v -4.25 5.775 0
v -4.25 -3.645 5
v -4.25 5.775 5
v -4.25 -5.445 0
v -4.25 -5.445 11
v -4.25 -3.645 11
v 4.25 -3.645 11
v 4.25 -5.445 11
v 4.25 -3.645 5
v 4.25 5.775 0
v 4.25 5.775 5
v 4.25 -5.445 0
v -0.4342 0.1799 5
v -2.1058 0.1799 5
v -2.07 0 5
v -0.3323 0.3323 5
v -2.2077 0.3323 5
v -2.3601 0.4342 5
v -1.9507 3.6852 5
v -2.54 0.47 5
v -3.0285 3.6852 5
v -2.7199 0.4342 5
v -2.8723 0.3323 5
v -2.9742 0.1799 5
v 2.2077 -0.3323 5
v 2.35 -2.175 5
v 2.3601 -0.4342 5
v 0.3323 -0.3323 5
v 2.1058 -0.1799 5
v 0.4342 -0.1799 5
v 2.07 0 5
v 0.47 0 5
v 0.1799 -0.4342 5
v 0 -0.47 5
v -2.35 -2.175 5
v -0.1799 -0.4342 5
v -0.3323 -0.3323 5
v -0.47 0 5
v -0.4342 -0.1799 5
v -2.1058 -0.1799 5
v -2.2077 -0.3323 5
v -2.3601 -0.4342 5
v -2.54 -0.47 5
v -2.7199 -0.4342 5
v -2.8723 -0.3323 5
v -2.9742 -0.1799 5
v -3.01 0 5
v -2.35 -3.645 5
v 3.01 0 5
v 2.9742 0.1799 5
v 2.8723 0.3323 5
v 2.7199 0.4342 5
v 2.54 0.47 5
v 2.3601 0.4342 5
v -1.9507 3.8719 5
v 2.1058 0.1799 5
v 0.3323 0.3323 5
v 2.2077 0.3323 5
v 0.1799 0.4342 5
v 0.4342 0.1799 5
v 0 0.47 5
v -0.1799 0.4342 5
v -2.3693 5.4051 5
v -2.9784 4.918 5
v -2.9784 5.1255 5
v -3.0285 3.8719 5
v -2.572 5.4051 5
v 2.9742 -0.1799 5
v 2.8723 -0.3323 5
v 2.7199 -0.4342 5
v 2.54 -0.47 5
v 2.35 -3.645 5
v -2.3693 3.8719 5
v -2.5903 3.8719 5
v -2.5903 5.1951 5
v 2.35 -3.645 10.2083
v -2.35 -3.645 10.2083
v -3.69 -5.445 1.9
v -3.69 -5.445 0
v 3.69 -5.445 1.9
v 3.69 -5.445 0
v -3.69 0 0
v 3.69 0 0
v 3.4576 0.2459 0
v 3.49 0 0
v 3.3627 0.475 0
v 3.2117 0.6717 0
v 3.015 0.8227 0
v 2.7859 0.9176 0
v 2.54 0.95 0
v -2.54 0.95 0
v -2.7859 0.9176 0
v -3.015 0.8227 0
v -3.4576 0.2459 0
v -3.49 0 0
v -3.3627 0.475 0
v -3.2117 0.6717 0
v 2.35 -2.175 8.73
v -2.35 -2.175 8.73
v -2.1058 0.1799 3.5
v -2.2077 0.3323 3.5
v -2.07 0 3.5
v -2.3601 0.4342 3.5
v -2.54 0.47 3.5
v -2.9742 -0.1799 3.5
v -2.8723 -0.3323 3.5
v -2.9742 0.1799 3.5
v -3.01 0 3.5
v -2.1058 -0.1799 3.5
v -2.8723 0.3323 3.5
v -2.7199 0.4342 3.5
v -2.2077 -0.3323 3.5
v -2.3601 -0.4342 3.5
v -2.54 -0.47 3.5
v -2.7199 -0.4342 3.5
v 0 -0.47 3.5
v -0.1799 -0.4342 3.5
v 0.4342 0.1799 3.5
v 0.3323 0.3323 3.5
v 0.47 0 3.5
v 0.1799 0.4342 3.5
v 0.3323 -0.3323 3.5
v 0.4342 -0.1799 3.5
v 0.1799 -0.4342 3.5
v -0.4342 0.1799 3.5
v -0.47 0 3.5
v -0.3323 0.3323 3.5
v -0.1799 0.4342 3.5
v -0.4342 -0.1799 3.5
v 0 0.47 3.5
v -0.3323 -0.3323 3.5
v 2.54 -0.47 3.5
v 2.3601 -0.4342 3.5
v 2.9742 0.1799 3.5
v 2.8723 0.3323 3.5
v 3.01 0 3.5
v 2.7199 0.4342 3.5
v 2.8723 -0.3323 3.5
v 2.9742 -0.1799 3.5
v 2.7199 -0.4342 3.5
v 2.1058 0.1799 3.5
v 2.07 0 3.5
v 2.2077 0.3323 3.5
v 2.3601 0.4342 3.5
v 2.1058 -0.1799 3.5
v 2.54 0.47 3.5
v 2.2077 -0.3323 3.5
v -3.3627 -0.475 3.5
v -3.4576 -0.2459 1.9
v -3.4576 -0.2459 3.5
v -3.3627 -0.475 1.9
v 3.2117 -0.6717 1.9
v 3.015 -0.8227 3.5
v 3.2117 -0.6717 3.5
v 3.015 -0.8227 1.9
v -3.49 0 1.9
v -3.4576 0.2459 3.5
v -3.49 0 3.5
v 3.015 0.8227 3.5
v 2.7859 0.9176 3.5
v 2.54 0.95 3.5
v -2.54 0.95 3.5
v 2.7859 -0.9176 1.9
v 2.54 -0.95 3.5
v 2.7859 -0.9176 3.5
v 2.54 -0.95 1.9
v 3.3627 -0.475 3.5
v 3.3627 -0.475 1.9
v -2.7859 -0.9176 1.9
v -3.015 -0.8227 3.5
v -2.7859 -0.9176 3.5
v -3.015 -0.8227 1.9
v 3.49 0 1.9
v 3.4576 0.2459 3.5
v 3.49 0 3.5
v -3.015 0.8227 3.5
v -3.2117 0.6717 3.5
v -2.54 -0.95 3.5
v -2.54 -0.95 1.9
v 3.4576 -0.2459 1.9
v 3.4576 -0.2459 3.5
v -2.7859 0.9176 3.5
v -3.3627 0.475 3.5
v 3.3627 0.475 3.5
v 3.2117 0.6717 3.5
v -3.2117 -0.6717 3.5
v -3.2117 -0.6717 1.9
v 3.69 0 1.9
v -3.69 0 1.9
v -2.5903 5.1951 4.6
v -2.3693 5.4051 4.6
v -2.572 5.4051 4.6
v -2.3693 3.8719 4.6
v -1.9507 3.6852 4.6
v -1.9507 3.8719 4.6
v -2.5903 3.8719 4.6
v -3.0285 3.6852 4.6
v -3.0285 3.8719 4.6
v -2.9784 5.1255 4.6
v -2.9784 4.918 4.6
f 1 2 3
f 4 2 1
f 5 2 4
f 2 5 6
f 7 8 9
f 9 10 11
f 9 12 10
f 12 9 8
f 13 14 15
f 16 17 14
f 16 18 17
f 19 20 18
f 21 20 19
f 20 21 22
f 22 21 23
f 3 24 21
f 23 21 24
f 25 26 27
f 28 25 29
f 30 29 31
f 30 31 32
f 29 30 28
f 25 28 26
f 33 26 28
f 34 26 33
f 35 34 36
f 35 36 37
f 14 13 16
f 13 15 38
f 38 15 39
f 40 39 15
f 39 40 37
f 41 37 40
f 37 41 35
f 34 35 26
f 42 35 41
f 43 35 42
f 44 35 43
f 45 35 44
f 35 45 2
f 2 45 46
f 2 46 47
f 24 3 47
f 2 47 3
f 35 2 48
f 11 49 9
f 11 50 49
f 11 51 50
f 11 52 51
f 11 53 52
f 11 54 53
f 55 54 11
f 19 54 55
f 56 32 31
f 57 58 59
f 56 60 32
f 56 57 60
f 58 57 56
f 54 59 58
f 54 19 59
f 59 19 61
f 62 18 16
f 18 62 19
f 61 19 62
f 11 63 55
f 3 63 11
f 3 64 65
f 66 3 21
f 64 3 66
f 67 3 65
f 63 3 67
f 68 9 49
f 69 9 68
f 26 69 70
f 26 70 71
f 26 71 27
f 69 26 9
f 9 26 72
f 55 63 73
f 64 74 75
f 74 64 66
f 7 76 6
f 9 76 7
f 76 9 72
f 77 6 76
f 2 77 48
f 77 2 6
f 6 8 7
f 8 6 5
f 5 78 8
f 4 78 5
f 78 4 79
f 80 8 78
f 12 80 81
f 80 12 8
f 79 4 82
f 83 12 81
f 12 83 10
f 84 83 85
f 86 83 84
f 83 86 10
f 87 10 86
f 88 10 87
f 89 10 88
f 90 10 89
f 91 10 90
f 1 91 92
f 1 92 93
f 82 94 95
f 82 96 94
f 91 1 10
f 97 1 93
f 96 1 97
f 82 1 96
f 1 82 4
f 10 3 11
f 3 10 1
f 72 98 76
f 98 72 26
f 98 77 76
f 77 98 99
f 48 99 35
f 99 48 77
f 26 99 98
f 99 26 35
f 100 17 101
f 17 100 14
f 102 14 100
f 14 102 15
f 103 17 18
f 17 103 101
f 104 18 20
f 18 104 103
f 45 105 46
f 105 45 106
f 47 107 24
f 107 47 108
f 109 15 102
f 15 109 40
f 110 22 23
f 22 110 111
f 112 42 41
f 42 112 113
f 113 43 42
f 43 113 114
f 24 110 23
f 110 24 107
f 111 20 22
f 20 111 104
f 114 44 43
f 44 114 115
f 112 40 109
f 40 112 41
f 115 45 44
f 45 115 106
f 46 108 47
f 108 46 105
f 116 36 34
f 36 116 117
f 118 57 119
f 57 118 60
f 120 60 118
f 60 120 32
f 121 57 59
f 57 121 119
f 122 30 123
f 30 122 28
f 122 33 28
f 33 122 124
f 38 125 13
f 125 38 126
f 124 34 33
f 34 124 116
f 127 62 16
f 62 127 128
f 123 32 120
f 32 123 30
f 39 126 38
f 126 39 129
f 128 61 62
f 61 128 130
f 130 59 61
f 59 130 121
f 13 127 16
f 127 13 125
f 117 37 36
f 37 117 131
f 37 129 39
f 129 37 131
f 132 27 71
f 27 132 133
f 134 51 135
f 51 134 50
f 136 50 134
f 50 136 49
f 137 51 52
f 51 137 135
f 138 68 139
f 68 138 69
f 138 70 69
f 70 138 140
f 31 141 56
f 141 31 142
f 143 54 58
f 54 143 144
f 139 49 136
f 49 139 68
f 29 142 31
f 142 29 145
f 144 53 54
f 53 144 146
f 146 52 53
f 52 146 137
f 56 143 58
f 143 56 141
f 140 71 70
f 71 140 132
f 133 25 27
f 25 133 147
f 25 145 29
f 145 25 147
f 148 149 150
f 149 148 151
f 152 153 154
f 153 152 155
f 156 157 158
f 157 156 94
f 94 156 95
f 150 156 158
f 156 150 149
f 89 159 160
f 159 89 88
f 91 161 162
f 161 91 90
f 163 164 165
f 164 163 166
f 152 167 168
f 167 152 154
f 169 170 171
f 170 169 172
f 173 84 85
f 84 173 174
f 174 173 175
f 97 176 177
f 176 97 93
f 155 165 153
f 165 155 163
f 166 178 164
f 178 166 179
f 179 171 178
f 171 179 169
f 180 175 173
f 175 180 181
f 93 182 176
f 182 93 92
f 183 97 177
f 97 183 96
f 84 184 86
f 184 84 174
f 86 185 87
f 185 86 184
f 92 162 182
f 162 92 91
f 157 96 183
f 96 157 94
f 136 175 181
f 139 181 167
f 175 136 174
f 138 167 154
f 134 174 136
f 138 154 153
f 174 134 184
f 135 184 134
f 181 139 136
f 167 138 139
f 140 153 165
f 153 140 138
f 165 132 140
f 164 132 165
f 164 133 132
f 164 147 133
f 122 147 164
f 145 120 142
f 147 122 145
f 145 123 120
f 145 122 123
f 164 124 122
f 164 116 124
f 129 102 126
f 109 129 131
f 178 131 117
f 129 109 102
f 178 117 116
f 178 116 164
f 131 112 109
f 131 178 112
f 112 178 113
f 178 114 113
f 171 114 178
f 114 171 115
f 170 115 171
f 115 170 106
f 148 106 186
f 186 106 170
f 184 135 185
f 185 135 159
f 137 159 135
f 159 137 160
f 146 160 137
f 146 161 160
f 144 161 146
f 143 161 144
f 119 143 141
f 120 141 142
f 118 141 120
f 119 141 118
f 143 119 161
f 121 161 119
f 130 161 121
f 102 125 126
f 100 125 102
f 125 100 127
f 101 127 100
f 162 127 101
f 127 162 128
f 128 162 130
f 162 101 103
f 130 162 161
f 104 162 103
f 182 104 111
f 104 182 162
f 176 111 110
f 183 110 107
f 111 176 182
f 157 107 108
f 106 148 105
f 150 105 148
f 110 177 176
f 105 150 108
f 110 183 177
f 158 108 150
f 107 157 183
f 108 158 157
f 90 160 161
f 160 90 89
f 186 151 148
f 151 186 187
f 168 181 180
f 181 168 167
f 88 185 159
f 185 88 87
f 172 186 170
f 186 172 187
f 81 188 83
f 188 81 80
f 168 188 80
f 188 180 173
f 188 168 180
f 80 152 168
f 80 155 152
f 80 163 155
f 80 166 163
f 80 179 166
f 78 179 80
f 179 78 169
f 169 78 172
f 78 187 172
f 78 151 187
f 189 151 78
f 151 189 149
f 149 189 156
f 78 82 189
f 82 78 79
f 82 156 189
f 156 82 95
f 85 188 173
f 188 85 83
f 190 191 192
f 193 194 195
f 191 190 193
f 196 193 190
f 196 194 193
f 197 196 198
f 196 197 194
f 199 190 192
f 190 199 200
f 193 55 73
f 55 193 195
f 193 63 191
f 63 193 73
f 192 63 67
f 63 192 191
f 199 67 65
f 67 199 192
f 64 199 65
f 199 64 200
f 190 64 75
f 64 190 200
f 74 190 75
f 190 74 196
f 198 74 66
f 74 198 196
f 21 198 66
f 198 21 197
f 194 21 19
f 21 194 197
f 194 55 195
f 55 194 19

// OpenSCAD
// SPDX-FileCopyrightText: 2026 Alon A. Rabinowitz
// SPDX-License-Identifier: CC-BY-4.0
// Shared under the Creative Commons Attribution 4.0 International licence
// (LICENSES/CC-BY-4.0.txt): reuse freely, including commercially, with attribution.

// 2.54 mm fan connector, printed: a male header and a female plug, 2, 3 or 4 pins, that fit each other and the
// usual 3-pin fan plug of the KK 254 kind. The pins of the male and the contacts of the female are 22 AWG solid
// wire, bared: no crimp terminals.
//
// Drawn from one fan plug measured with calipers (Alon, 9 Oct 2026) and the 2.54 mm pitch; no other model was
// used. One self-contained file: the Customizer's groups are the settings, [Hidden] what is worked out from them.
//
// THE FRAME. The pins run along X at Y = 0, pin 1 at -X, pointing up (+Z). The female's text face is towards +Y,
// its ribs towards -Y. The male prints on its underside; the female prints standing on its back end, the open end
// up. "pair" draws the female seated on the male.

/* [Part] */
part = "male";          // [male, female, coupon, pair]
pins = 3;               // [2, 3, 4]

/* [The plug, measured on a fan's 3-pin plug] */
plug_a3 = 8.0;          // MEASURED: across its pins, 3-pin (A). n pins: this plus a pitch for each pin more.
plug_b = 5.2;           // MEASURED: its thickness without the ribs, over the lip (B).
plug_c = 12.77;         // MEASURED: its length along the wires (C).
plug_d = 2.55;          // MEASURED: from the text face to the near wall of a pin's hole (D).
plug_hole = 1.45;       // MEASURED: a pin's hole in the open end.
rib = [1.1, 5.2, 6.67]; // MEASURED: the ribs on the face opposite the text: width, the gap between them, and the plug's thickness over them. An NZXT fan's ribs are 0.92 wide and stand 1.08 proud, where these stand 1.47.
lip = [0.3, 2.2];       // MEASURED: the lip across the open end between the ribs: its height, and its length along the plug (an NZXT fan's: 1.9).
rib_inset_2 = 0.3;      // <<CONFIRM>> 2-pin: the ribs stand this far in from the ends, as the 3-pin's do. 3 and 4 pins keep the 3-pin's ribs over pins 1-3.
pitch = 2.54;

/* [Wire: 22 AWG solid] */
wire = [0.64, 1.6];     // The core, by the gauge (0.644), and the insulation's outside (MEASURED).

/* [Male] */
male_pin = 6;           // How far each pin stands above the block: a header's mating length.
male_base = [5, 1.5];   // The block: its height, and how much of it at the top holds the core alone - below, a slot takes the insulation.
male_wall = [1.8, 6];   // The wall behind the plug: its thickness, and how far it stands above the block.
male_front = 2.5;       // The block runs on this far past the plug's text face, for pin 1's mark.
play = 0.25;            // Round the plug: to the wall, to the key and between its ribs.

/* [Female] */
interference = 0.05;    // How far the contact wire stands into a pin's way. Print the coupon and pick the one that holds. <<CONFIRM>>
female_depth = 7;       // The cavity's depth from the open end: past a pin's 6 mm.
female_slot = 4;        // The insulation's slot, from the back end.
female_hook = [0.8, 1.2];   // The notch in the open end for the contact's bent-over tip: its depth and its length towards the text face.
female_chamfer = 0.3;   // Each cavity's lead-in.

/* [Printing - mirrors the print profile; scad-check.sh compares the first two with the slicer's] */
fdm_layer_h     = 0.2;
fdm_extrusion_w = 0.45;
fdm_hole_comp   = 0.15; // Added to every hole's radius - docs/fdm-design-rules.md section 2.

/* [Hidden] */
$fn = 24;
eps = 0.01;
coupon_i = [0, 0.05, 0.1, 0.15];
// The plug: across n pins; each pin's X, pin 1 first; the ribs' middle (pin 2's for 3 and 4 pins); the gap between
// them; Y from the pins to the text face, to the face behind the lip, to the lip, to the ribs' tips.
plug_a = plug_a3 + (pins - 3) * pitch;
xs = [for (k = [0 : pins - 1]) (k - (pins - 1) / 2) * pitch];
rib_x = pins == 2 ? 0 : xs[1];
rib_gap = pins == 2 ? plug_a - 2 * (rib_inset_2 + rib[0]) : rib[1];
y_text = plug_d + plug_hole / 2;
y_lip = plug_b - y_text;
y_back = y_lip - lip[0];
y_ribs = rib[2] - y_text;
// The male: its wall's inside, its key's face and width, its holes as cut, its ends, back and front.
m_wall_y = -(y_ribs + play);
m_key_y = -(y_lip + play);
m_key_w = rib_gap - 2 * play;
core_d = wire[0] + 2 * fdm_hole_comp;
ins_d = wire[1] + 2 * fdm_hole_comp;
m_x0 = -plug_a / 2 - play;
m_x1 = plug_a / 2 + play;
m_y0 = m_wall_y - male_wall[0];
m_y1 = y_text + male_front;
m_strip = male_base[1] + male_pin;
// The female: the contact wire's line, out from the pins towards the text face; the cavity, as cut, from the
// pin's far side to the wire's; how much of each wire to bare.
f_wire_y = (wire[0] + wire[0]) / 2 - interference;
f_cav = [wire[0] + 2 * 0.1 + 2 * fdm_hole_comp, -(wire[0] / 2 + 0.1 + fdm_hole_comp)];   // width, and its pin-side wall
f_strip = plug_c - female_slot + female_hook[1];

assert(pins >= 2 && pins <= 4, "pins: 2, 3 or 4");
assert(m_key_w > 2 * fdm_extrusion_w && m_key_y > m_wall_y, "the male's key must be wide enough to print and stand out from its wall");
assert(male_base[0] - male_base[1] > ins_d && pitch - core_d > fdm_extrusion_w,
    "the male's block must hold the insulation's slot under the cores' holes, a line of it between them");
assert(pitch - f_cav[0] > fdm_extrusion_w, "the female's cavities must leave a line of wall between them");
assert(f_cav[1] > -y_back + 2 * fdm_extrusion_w, "the female's cavities must leave two lines of wall to the ribbed face");
assert(f_wire_y + wire[0] / 2 + fdm_hole_comp < y_text - 2 * fdm_extrusion_w && f_wire_y + female_hook[1] < y_text - fdm_extrusion_w,
    "the female's contacts and their hooks must stay inside the text face");
assert(female_depth + eps < plug_c - female_slot, "the female's cavities must stop short of the insulation's slot");
assert(rib_gap > 2 * fdm_extrusion_w + 2 * play && plug_a / 2 - abs(rib_x) >= rib_gap / 2 + rib[0] - eps,
    "the ribs must fit on the plug, with a key between them");

// ------------------------------------------------------------------ the male
// The block and the wall, one L-shaped profile along X: two boxes sharing the back face would meet in a line of
// T-junctions. Each wire comes up its slot from below, its insulation stopping where the slot ends, so it cannot be
// pulled out upwards; its bared core goes on up its hole and stands as the pin. Under the block each wire bends over
// into a groove to the back edge: once the block is fixed down, that bend stops a pin being pushed down.
module male_key() let(h = male_base[0], wh = male_wall[1] - 0.5, d = m_key_y - m_wall_y, e = 0.3)
    // its top chamfered at 45 degrees, a lead-in between the ribs, 0.5 mm under the wall's top; it starts e inside
    // the wall, so the chamfer crosses the wall's face: an edge lying in that face leaves sliver facets
    translate([rib_x - m_key_w / 2, m_wall_y - e, h - eps]) hull() {
        cube([m_key_w, d + e, wh - d - e + eps]);
        cube([m_key_w, eps, wh + eps]);
    }
module male() let(h = male_base[0], c = male_base[1], wh = male_wall[1], s = xs[pins - 1] - xs[0] + ins_d + 0.4)
    difference() {
        union() {
            translate([m_x0, 0, 0]) rotate([90, 0, 90]) linear_extrude(m_x1 - m_x0)
                polygon([[m_y0, 0], [m_y1, 0], [m_y1, h], [m_wall_y, h], [m_wall_y, h + wh], [m_y0, h + wh]]);
            male_key();
        }
        for (x = xs) translate([x, 0, h - c - eps]) cylinder(d = core_d, h = c + 1, $fn = 16);
        translate([0, 0, -1]) linear_extrude(h - c + 1)
            hull() for (x = [xs[0], xs[pins - 1]]) translate([x, 0]) circle(d = ins_d);
        translate([-s / 2, m_y0 - 1, -1]) cube([s, 1 - m_y0, ins_d + 1]);
        // pin 1's mark, in front of where the plug stands
        translate([xs[0], (y_text + m_y1) / 2, h - 0.4]) linear_extrude(1)
            text("1", size = 1.8, halign = "center", valign = "center");
    }
// The male's pins: the wires' bared cores, from where the insulation stops to the tips.
module male_pins() for (x = xs) translate([x, 0, male_base[0] - male_base[1]]) cylinder(d = wire[0], h = m_strip, $fn = 16);

// ------------------------------------------------------------------ the female
// Drawn with its open end at Z = 0 and its back end at Z = plug_c. Each wire comes in from the back: its insulation
// in a slot that stops it going further in, its bared core on through its hole and down the cavity along the text
// side's wall, and its tip bent over into a notch in the open end, which stops it being pulled back out. A pin going
// in squeezes past the wire by `interference`.
// The cavity's text-side wall stands 0.05 mm past the core's hole: level with it, the two would be tangent.
module female_cavity(x, i) let(cy = (wire[0] + wire[0]) / 2 - i, w = f_cav[0], y0 = f_cav[1],
                               y1 = cy + core_d / 2 + 0.05, ch = female_chamfer) {
    // the cavity, with a lead-in at the open end
    translate([x - w / 2, y0, -1]) cube([w, y1 - y0, female_depth + 1]);
    hull() {
        translate([x - w / 2 - ch, y0 - ch, -1]) cube([w + 2 * ch, y1 - y0 + 2 * ch, 1]);
        translate([x - w / 2, y0, ch]) cube([w, y1 - y0, eps]);
    }
    // the core's hole, on from the cavity's end to the insulation's slot
    translate([x, cy, female_depth - eps]) cylinder(d = core_d, h = plug_c - female_slot - female_depth + 2 * eps, $fn = 16);
    // the hook's notch, from the wire's line towards the text face
    translate([x - core_d / 2, cy, -1]) cube([core_d, female_hook[1], female_hook[0] + 1]);
}
module female_body() let(a = plug_a, c = plug_c, rw = rib[0])
    union() {
        translate([-a / 2, -y_back, 0]) cube([a, y_text + y_back, c]);
        // the lip across the open end, between the ribs
        translate([rib_x - rib_gap / 2 - eps, -y_lip, 0]) cube([rib_gap + 2 * eps, lip[0] + eps, lip[1]]);
        for (s = [-1, 1]) translate([rib_x + s * (rib_gap + rw) / 2 - rw / 2, -y_ribs, 0]) cube([rw, y_ribs - y_back + eps, c]);
    }
module female(i = interference) let(cy = (wire[0] + wire[0]) / 2 - i)
    difference() {
        female_body();
        for (x = xs) female_cavity(x, i);
        // the insulation's slot, from the back end
        translate([0, 0, plug_c - female_slot]) linear_extrude(female_slot + 1)
            hull() for (x = [xs[0], xs[pins - 1]]) translate([x, cy]) circle(d = ins_d);
        // pin 1's arrow on the text face
        translate([xs[0], y_text - 0.4, plug_c / 2]) rotate([-90, 0, 0]) linear_extrude(1)
            polygon([[-0.9, 1.2], [0.9, 1.2], [0, -0.6]]);
    }
// The female as it prints: standing on its back end, the open end up.
module female_printing() translate([0, 0, plug_c]) mirror([0, 0, 1]) female();

// ------------------------------------------------------------------ the coupon
// Four single cavities in a row, one at each of coupon_i, numbered 1 to 4 on the text face: thread a wire into each,
// push a pin in, and use the interference of the one that holds firmly and still lets the pin in.
module coupon() let(g = 5, n = len(coupon_i))
    translate([0, 0, plug_c]) mirror([0, 0, 1]) difference() {
        translate([-g / 2, -y_back, 0]) cube([n * g, y_text + y_back, plug_c]);
        for (j = [0 : n - 1]) translate([j * g, 0, 0]) {
            female_cavity(0, coupon_i[j]);
            translate([0, (wire[0] + wire[0]) / 2 - coupon_i[j], plug_c - female_slot]) cylinder(d = ins_d, h = female_slot + 1);
            translate([0, y_text - 0.4, plug_c / 2]) rotate([-90, 0, 0]) linear_extrude(1)
                text(str(j + 1), size = 2.5, halign = "center", valign = "center");
        }
    }

// ------------------------------------------------------------------ what is drawn
module say() echo(str("fan connector, ", pins, " pins: the male's wires bared ", m_strip, " mm, the female's ", f_strip,
    " mm; the female's contacts stand ", interference, " mm into a pin's way"));

if (part == "male") { male(); say(); }
else if (part == "female") { female_printing(); say(); }
else if (part == "coupon") coupon();
else if (part == "pair") {
    color("dimgray") male();
    color("goldenrod") male_pins();
    color("ivory") translate([0, 0, male_base[0]]) female();
}
// The checks: each must come out empty (scripts/fan-connector-checks.py). The female seated 0.01 mm up on the
// male; the male's pins through both, touching neither; a header's square pin in each cavity.
else if (part == "check_pair") intersection() { male(); translate([0, 0, male_base[0] + eps]) female(); }
else if (part == "check_pins") intersection() {
    union() { male(); translate([0, 0, male_base[0] + eps]) female(); }
    male_pins();
}
else if (part == "check_square") intersection() {
    female();
    for (x = xs) translate([x - wire[0] / 2, -wire[0] / 2, -1]) cube([wire[0], wire[0], female_depth]);
}
else if (part == "none") { }   // a file that includes this one, to draw its own
else assert(false, str("unknown part: ", part));
